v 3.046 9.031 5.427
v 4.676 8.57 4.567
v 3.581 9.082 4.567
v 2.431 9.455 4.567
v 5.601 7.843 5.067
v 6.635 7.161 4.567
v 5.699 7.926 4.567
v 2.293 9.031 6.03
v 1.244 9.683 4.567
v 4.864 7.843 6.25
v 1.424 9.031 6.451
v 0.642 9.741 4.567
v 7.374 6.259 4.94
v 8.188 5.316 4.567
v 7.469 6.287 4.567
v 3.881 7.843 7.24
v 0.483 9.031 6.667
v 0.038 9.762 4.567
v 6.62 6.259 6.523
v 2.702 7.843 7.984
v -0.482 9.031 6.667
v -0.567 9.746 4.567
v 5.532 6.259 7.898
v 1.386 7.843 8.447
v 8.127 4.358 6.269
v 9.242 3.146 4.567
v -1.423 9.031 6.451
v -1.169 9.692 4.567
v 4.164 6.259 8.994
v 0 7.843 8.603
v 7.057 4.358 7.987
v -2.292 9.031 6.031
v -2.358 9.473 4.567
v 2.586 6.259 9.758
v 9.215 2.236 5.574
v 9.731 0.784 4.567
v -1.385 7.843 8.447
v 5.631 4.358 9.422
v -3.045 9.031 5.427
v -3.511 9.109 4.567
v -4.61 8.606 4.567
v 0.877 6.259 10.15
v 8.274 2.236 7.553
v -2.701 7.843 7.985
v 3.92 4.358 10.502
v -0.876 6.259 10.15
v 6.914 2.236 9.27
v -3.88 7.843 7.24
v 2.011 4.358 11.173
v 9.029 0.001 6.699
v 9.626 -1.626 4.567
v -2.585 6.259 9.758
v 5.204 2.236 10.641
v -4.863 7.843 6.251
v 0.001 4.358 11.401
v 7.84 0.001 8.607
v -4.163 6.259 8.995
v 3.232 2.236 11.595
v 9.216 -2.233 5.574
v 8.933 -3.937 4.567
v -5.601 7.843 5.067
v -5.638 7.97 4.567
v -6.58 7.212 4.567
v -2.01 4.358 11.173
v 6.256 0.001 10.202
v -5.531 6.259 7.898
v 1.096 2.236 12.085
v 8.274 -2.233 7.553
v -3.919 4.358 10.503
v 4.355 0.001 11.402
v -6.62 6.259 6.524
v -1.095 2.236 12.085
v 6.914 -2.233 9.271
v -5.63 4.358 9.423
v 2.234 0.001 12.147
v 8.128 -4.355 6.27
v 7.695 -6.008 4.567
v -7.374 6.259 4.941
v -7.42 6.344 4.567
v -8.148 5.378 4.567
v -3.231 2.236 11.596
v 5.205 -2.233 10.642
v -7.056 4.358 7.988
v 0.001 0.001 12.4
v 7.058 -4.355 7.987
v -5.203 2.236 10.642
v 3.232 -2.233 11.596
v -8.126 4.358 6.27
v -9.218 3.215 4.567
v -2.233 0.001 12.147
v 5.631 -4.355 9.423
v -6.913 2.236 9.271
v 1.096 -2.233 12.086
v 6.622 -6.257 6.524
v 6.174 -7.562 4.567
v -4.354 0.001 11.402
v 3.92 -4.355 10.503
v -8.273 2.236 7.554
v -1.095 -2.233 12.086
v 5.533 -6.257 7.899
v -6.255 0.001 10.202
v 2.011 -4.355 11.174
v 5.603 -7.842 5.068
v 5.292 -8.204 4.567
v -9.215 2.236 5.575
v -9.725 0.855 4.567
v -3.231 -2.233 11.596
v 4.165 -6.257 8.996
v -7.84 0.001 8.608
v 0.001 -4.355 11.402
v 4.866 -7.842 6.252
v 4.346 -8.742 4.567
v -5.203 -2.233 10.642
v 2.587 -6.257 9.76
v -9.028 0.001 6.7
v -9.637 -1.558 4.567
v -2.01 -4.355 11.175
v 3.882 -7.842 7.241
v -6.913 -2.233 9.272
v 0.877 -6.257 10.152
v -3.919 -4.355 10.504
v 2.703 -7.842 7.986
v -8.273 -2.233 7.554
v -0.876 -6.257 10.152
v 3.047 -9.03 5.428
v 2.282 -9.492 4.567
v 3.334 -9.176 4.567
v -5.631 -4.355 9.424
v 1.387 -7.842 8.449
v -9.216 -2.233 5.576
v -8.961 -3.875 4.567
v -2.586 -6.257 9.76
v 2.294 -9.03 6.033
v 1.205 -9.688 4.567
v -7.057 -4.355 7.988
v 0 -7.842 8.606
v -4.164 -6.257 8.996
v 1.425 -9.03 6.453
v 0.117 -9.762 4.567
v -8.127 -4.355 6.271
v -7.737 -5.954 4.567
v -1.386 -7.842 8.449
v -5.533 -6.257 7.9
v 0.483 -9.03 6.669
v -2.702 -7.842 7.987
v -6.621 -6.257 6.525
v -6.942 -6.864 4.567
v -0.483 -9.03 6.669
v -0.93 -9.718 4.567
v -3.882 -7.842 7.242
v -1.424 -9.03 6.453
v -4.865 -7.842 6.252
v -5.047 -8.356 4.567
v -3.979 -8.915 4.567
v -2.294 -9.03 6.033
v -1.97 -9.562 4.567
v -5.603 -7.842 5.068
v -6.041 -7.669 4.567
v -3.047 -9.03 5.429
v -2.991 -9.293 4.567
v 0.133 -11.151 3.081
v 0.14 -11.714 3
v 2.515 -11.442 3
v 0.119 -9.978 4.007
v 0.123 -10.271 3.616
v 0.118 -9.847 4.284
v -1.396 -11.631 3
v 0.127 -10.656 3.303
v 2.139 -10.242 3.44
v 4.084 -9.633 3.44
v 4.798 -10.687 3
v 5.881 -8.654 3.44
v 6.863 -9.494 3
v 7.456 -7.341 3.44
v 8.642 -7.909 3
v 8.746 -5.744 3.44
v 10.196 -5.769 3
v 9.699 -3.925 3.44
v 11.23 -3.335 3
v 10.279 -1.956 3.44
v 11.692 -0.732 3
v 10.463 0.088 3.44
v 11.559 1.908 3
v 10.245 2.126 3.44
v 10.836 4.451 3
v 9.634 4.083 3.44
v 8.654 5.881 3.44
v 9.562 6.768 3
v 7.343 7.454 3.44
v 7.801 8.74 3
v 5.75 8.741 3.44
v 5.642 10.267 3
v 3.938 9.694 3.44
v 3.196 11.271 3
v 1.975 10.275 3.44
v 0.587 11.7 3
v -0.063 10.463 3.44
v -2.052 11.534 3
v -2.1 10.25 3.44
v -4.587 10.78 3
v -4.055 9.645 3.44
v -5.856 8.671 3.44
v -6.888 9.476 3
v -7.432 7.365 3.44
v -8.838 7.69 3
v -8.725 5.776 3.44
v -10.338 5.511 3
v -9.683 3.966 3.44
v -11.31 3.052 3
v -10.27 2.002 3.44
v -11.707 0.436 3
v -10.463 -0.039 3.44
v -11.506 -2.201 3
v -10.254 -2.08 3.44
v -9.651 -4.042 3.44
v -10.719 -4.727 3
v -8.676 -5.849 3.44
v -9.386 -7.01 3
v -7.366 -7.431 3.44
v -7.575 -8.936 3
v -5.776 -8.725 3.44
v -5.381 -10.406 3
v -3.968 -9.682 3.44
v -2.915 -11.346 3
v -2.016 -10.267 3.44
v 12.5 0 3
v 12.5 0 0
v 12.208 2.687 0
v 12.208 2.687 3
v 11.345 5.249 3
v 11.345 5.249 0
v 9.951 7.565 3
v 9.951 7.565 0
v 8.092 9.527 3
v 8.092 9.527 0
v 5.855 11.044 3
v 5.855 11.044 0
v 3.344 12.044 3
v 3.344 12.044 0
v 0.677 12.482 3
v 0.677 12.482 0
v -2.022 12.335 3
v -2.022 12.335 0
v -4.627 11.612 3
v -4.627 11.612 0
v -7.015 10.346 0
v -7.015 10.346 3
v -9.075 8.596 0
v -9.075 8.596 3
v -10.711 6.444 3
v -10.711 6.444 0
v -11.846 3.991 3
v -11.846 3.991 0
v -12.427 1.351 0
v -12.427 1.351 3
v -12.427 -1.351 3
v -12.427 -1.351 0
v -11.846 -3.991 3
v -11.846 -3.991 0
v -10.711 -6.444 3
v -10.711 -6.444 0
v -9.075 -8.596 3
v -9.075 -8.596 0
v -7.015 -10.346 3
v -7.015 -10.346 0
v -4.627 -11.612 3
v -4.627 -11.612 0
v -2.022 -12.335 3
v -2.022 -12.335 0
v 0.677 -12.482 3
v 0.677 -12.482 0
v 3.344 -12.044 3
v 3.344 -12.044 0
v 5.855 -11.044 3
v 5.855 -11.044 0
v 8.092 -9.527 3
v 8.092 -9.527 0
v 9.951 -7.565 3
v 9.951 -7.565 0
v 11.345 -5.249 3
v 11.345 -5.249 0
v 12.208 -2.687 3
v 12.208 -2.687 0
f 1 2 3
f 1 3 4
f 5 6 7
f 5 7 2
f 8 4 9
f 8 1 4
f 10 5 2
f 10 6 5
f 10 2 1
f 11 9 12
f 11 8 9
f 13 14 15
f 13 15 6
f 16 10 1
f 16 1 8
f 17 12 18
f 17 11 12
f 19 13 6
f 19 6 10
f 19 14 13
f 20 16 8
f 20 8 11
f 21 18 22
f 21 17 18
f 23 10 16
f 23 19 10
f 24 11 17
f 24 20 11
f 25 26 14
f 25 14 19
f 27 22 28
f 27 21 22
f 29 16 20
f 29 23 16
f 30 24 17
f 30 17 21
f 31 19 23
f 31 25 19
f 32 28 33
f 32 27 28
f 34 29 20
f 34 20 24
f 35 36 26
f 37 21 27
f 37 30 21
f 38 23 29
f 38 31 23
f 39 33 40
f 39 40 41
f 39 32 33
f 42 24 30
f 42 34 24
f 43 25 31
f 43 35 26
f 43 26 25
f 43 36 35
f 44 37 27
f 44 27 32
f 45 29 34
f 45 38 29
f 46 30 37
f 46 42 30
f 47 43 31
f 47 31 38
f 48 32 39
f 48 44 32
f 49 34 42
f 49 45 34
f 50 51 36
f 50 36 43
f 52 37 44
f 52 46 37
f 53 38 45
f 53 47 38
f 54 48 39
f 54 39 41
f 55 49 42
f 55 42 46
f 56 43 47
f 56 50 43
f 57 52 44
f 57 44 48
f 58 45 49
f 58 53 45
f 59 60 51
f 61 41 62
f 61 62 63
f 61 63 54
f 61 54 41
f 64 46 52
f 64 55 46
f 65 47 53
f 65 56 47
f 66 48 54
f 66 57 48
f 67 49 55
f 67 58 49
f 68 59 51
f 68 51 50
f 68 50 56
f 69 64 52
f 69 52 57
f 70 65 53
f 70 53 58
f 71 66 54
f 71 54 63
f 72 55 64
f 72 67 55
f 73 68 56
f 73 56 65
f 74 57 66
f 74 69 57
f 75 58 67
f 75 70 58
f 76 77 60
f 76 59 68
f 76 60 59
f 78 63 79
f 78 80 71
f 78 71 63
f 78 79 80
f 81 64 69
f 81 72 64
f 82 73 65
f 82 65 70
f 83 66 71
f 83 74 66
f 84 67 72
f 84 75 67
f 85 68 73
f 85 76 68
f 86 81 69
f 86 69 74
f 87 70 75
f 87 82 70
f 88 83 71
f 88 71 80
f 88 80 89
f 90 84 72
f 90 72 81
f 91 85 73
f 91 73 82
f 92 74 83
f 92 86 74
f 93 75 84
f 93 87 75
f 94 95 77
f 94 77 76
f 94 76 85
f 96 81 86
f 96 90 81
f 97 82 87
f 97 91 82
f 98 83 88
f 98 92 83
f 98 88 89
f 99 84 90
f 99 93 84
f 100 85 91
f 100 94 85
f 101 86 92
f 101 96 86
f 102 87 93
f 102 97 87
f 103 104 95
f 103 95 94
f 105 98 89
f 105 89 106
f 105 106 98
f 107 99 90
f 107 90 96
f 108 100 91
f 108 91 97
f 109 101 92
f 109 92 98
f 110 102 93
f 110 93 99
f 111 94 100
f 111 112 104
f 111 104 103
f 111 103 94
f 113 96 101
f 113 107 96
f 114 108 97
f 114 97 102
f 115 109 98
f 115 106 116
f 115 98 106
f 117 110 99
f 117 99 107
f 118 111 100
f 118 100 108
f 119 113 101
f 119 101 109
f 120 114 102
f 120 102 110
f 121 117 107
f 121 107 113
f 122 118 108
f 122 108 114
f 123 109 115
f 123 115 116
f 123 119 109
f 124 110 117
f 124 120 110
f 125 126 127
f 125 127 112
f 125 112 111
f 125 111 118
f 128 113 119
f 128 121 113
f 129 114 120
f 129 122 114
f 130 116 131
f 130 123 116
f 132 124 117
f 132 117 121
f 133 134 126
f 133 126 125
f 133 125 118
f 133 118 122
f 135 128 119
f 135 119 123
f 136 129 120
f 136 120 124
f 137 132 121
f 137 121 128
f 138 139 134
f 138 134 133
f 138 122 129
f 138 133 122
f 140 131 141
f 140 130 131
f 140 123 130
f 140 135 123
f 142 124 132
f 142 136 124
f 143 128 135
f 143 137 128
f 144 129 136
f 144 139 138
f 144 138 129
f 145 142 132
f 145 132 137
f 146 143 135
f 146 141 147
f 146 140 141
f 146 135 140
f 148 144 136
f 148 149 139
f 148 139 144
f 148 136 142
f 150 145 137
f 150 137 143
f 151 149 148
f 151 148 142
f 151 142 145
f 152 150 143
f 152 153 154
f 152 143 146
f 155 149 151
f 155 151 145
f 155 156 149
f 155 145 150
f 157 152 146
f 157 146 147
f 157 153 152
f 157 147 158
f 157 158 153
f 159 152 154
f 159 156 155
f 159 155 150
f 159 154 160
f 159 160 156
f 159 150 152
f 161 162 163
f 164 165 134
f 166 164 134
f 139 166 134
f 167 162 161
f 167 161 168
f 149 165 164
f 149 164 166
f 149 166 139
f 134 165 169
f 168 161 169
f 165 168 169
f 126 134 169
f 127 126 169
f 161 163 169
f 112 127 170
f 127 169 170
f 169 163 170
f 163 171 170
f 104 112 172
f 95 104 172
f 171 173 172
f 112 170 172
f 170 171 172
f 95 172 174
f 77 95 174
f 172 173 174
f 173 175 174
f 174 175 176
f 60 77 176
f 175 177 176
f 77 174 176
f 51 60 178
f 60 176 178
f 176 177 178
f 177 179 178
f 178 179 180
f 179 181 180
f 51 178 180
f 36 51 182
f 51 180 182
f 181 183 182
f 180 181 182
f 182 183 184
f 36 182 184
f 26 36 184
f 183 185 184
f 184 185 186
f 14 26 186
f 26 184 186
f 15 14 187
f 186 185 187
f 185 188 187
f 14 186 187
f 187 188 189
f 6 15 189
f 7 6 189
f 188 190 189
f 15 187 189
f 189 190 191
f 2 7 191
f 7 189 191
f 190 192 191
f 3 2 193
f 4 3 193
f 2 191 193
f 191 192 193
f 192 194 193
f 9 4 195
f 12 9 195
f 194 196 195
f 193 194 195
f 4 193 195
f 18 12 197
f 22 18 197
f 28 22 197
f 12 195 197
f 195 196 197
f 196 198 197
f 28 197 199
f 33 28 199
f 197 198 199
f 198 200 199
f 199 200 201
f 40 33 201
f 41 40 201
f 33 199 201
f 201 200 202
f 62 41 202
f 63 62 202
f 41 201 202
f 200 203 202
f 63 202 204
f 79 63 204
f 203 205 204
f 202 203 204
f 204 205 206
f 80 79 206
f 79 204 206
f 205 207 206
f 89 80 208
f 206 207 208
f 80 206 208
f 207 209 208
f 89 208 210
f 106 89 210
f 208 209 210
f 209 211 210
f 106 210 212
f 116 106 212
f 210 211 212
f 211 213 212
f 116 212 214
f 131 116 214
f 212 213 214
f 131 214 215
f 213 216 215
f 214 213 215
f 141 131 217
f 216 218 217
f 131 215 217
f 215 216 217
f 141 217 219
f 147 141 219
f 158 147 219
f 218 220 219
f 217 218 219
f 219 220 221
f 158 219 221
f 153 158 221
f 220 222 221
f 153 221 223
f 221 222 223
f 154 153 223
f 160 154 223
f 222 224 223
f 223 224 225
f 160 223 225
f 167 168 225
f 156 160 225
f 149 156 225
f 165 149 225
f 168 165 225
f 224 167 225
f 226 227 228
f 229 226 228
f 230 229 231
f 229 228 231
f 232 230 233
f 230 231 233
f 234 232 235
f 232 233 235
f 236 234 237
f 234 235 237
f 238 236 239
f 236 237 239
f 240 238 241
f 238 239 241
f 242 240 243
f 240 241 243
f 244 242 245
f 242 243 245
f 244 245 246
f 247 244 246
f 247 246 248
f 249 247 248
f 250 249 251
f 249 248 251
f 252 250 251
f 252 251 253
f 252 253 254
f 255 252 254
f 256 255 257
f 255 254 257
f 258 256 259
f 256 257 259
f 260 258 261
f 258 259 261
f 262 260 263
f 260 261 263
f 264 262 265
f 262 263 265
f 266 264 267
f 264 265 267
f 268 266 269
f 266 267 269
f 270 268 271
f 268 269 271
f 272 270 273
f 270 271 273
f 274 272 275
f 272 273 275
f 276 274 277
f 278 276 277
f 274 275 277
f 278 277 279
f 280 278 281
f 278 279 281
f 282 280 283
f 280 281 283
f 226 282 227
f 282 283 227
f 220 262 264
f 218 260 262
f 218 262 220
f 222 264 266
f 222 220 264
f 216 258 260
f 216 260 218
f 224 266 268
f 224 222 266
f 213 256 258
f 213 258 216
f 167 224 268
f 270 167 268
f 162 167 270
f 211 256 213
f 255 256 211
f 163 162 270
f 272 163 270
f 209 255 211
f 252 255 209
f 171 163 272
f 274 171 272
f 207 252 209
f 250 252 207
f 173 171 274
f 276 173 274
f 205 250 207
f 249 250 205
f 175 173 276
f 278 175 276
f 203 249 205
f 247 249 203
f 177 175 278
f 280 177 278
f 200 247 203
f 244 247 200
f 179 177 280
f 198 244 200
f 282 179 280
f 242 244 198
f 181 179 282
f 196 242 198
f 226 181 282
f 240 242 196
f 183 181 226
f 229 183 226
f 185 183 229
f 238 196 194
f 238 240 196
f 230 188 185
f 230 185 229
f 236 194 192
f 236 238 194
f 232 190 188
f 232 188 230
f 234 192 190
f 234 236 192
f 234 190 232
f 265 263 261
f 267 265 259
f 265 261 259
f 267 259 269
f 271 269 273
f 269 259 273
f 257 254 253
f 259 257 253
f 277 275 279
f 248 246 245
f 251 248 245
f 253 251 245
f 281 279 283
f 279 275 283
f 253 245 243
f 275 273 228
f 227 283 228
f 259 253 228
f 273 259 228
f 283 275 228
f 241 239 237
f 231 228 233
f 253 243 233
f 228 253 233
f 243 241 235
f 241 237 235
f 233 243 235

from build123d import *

# Parameters (mm, degrees)
SKETCH_R          = 12.5
PAD_DEPTH         = 3
SPHERE_ANGLE      = 180
SPHERE_ROLL_ANGLE = 90
FILLET_R          = 2


with BuildPart() as base_pad:
    # Sketch → Pad (new body)
    with BuildSketch(Plane.XY):
        Circle(SKETCH_R)
    extrude(amount=PAD_DEPTH)


with BuildPart() as fillet_body:
    # Sphere → Sphere (revolve)
    with BuildSketch(Plane.XZ):
        with BuildLine():
            ThreePointArc((0, -10), (10, 0), (0, 10))
            Line((0, 10), (0, -10))
        make_face()
    revolve(axis=Axis((0, 0, 0), (0, 0, 1)), revolution_arc=SPHERE_ANGLE)


with BuildPart() as fillet_body_1:
    # Sphere roll: moved
    add(fillet_body.part.rotate(Axis((0, 0, 0), (1, 0, 0)), SPHERE_ROLL_ANGLE))


with BuildPart() as fillet_body_2:
    # Sphere placement: moved
    add(fillet_body_1.part.moved(Location((0, 0, 2.4))))

    # Fusion: union Base-pad
    add(base_pad.part)

    # Fillet
    fillet_edges = [fillet_body_2.edges().sort_by_distance(p)[0] for p in [
        (0, -9.981984, 3),
    ]]
    fillet(fillet_edges, radius=FILLET_R)


solid = fillet_body_2.part
